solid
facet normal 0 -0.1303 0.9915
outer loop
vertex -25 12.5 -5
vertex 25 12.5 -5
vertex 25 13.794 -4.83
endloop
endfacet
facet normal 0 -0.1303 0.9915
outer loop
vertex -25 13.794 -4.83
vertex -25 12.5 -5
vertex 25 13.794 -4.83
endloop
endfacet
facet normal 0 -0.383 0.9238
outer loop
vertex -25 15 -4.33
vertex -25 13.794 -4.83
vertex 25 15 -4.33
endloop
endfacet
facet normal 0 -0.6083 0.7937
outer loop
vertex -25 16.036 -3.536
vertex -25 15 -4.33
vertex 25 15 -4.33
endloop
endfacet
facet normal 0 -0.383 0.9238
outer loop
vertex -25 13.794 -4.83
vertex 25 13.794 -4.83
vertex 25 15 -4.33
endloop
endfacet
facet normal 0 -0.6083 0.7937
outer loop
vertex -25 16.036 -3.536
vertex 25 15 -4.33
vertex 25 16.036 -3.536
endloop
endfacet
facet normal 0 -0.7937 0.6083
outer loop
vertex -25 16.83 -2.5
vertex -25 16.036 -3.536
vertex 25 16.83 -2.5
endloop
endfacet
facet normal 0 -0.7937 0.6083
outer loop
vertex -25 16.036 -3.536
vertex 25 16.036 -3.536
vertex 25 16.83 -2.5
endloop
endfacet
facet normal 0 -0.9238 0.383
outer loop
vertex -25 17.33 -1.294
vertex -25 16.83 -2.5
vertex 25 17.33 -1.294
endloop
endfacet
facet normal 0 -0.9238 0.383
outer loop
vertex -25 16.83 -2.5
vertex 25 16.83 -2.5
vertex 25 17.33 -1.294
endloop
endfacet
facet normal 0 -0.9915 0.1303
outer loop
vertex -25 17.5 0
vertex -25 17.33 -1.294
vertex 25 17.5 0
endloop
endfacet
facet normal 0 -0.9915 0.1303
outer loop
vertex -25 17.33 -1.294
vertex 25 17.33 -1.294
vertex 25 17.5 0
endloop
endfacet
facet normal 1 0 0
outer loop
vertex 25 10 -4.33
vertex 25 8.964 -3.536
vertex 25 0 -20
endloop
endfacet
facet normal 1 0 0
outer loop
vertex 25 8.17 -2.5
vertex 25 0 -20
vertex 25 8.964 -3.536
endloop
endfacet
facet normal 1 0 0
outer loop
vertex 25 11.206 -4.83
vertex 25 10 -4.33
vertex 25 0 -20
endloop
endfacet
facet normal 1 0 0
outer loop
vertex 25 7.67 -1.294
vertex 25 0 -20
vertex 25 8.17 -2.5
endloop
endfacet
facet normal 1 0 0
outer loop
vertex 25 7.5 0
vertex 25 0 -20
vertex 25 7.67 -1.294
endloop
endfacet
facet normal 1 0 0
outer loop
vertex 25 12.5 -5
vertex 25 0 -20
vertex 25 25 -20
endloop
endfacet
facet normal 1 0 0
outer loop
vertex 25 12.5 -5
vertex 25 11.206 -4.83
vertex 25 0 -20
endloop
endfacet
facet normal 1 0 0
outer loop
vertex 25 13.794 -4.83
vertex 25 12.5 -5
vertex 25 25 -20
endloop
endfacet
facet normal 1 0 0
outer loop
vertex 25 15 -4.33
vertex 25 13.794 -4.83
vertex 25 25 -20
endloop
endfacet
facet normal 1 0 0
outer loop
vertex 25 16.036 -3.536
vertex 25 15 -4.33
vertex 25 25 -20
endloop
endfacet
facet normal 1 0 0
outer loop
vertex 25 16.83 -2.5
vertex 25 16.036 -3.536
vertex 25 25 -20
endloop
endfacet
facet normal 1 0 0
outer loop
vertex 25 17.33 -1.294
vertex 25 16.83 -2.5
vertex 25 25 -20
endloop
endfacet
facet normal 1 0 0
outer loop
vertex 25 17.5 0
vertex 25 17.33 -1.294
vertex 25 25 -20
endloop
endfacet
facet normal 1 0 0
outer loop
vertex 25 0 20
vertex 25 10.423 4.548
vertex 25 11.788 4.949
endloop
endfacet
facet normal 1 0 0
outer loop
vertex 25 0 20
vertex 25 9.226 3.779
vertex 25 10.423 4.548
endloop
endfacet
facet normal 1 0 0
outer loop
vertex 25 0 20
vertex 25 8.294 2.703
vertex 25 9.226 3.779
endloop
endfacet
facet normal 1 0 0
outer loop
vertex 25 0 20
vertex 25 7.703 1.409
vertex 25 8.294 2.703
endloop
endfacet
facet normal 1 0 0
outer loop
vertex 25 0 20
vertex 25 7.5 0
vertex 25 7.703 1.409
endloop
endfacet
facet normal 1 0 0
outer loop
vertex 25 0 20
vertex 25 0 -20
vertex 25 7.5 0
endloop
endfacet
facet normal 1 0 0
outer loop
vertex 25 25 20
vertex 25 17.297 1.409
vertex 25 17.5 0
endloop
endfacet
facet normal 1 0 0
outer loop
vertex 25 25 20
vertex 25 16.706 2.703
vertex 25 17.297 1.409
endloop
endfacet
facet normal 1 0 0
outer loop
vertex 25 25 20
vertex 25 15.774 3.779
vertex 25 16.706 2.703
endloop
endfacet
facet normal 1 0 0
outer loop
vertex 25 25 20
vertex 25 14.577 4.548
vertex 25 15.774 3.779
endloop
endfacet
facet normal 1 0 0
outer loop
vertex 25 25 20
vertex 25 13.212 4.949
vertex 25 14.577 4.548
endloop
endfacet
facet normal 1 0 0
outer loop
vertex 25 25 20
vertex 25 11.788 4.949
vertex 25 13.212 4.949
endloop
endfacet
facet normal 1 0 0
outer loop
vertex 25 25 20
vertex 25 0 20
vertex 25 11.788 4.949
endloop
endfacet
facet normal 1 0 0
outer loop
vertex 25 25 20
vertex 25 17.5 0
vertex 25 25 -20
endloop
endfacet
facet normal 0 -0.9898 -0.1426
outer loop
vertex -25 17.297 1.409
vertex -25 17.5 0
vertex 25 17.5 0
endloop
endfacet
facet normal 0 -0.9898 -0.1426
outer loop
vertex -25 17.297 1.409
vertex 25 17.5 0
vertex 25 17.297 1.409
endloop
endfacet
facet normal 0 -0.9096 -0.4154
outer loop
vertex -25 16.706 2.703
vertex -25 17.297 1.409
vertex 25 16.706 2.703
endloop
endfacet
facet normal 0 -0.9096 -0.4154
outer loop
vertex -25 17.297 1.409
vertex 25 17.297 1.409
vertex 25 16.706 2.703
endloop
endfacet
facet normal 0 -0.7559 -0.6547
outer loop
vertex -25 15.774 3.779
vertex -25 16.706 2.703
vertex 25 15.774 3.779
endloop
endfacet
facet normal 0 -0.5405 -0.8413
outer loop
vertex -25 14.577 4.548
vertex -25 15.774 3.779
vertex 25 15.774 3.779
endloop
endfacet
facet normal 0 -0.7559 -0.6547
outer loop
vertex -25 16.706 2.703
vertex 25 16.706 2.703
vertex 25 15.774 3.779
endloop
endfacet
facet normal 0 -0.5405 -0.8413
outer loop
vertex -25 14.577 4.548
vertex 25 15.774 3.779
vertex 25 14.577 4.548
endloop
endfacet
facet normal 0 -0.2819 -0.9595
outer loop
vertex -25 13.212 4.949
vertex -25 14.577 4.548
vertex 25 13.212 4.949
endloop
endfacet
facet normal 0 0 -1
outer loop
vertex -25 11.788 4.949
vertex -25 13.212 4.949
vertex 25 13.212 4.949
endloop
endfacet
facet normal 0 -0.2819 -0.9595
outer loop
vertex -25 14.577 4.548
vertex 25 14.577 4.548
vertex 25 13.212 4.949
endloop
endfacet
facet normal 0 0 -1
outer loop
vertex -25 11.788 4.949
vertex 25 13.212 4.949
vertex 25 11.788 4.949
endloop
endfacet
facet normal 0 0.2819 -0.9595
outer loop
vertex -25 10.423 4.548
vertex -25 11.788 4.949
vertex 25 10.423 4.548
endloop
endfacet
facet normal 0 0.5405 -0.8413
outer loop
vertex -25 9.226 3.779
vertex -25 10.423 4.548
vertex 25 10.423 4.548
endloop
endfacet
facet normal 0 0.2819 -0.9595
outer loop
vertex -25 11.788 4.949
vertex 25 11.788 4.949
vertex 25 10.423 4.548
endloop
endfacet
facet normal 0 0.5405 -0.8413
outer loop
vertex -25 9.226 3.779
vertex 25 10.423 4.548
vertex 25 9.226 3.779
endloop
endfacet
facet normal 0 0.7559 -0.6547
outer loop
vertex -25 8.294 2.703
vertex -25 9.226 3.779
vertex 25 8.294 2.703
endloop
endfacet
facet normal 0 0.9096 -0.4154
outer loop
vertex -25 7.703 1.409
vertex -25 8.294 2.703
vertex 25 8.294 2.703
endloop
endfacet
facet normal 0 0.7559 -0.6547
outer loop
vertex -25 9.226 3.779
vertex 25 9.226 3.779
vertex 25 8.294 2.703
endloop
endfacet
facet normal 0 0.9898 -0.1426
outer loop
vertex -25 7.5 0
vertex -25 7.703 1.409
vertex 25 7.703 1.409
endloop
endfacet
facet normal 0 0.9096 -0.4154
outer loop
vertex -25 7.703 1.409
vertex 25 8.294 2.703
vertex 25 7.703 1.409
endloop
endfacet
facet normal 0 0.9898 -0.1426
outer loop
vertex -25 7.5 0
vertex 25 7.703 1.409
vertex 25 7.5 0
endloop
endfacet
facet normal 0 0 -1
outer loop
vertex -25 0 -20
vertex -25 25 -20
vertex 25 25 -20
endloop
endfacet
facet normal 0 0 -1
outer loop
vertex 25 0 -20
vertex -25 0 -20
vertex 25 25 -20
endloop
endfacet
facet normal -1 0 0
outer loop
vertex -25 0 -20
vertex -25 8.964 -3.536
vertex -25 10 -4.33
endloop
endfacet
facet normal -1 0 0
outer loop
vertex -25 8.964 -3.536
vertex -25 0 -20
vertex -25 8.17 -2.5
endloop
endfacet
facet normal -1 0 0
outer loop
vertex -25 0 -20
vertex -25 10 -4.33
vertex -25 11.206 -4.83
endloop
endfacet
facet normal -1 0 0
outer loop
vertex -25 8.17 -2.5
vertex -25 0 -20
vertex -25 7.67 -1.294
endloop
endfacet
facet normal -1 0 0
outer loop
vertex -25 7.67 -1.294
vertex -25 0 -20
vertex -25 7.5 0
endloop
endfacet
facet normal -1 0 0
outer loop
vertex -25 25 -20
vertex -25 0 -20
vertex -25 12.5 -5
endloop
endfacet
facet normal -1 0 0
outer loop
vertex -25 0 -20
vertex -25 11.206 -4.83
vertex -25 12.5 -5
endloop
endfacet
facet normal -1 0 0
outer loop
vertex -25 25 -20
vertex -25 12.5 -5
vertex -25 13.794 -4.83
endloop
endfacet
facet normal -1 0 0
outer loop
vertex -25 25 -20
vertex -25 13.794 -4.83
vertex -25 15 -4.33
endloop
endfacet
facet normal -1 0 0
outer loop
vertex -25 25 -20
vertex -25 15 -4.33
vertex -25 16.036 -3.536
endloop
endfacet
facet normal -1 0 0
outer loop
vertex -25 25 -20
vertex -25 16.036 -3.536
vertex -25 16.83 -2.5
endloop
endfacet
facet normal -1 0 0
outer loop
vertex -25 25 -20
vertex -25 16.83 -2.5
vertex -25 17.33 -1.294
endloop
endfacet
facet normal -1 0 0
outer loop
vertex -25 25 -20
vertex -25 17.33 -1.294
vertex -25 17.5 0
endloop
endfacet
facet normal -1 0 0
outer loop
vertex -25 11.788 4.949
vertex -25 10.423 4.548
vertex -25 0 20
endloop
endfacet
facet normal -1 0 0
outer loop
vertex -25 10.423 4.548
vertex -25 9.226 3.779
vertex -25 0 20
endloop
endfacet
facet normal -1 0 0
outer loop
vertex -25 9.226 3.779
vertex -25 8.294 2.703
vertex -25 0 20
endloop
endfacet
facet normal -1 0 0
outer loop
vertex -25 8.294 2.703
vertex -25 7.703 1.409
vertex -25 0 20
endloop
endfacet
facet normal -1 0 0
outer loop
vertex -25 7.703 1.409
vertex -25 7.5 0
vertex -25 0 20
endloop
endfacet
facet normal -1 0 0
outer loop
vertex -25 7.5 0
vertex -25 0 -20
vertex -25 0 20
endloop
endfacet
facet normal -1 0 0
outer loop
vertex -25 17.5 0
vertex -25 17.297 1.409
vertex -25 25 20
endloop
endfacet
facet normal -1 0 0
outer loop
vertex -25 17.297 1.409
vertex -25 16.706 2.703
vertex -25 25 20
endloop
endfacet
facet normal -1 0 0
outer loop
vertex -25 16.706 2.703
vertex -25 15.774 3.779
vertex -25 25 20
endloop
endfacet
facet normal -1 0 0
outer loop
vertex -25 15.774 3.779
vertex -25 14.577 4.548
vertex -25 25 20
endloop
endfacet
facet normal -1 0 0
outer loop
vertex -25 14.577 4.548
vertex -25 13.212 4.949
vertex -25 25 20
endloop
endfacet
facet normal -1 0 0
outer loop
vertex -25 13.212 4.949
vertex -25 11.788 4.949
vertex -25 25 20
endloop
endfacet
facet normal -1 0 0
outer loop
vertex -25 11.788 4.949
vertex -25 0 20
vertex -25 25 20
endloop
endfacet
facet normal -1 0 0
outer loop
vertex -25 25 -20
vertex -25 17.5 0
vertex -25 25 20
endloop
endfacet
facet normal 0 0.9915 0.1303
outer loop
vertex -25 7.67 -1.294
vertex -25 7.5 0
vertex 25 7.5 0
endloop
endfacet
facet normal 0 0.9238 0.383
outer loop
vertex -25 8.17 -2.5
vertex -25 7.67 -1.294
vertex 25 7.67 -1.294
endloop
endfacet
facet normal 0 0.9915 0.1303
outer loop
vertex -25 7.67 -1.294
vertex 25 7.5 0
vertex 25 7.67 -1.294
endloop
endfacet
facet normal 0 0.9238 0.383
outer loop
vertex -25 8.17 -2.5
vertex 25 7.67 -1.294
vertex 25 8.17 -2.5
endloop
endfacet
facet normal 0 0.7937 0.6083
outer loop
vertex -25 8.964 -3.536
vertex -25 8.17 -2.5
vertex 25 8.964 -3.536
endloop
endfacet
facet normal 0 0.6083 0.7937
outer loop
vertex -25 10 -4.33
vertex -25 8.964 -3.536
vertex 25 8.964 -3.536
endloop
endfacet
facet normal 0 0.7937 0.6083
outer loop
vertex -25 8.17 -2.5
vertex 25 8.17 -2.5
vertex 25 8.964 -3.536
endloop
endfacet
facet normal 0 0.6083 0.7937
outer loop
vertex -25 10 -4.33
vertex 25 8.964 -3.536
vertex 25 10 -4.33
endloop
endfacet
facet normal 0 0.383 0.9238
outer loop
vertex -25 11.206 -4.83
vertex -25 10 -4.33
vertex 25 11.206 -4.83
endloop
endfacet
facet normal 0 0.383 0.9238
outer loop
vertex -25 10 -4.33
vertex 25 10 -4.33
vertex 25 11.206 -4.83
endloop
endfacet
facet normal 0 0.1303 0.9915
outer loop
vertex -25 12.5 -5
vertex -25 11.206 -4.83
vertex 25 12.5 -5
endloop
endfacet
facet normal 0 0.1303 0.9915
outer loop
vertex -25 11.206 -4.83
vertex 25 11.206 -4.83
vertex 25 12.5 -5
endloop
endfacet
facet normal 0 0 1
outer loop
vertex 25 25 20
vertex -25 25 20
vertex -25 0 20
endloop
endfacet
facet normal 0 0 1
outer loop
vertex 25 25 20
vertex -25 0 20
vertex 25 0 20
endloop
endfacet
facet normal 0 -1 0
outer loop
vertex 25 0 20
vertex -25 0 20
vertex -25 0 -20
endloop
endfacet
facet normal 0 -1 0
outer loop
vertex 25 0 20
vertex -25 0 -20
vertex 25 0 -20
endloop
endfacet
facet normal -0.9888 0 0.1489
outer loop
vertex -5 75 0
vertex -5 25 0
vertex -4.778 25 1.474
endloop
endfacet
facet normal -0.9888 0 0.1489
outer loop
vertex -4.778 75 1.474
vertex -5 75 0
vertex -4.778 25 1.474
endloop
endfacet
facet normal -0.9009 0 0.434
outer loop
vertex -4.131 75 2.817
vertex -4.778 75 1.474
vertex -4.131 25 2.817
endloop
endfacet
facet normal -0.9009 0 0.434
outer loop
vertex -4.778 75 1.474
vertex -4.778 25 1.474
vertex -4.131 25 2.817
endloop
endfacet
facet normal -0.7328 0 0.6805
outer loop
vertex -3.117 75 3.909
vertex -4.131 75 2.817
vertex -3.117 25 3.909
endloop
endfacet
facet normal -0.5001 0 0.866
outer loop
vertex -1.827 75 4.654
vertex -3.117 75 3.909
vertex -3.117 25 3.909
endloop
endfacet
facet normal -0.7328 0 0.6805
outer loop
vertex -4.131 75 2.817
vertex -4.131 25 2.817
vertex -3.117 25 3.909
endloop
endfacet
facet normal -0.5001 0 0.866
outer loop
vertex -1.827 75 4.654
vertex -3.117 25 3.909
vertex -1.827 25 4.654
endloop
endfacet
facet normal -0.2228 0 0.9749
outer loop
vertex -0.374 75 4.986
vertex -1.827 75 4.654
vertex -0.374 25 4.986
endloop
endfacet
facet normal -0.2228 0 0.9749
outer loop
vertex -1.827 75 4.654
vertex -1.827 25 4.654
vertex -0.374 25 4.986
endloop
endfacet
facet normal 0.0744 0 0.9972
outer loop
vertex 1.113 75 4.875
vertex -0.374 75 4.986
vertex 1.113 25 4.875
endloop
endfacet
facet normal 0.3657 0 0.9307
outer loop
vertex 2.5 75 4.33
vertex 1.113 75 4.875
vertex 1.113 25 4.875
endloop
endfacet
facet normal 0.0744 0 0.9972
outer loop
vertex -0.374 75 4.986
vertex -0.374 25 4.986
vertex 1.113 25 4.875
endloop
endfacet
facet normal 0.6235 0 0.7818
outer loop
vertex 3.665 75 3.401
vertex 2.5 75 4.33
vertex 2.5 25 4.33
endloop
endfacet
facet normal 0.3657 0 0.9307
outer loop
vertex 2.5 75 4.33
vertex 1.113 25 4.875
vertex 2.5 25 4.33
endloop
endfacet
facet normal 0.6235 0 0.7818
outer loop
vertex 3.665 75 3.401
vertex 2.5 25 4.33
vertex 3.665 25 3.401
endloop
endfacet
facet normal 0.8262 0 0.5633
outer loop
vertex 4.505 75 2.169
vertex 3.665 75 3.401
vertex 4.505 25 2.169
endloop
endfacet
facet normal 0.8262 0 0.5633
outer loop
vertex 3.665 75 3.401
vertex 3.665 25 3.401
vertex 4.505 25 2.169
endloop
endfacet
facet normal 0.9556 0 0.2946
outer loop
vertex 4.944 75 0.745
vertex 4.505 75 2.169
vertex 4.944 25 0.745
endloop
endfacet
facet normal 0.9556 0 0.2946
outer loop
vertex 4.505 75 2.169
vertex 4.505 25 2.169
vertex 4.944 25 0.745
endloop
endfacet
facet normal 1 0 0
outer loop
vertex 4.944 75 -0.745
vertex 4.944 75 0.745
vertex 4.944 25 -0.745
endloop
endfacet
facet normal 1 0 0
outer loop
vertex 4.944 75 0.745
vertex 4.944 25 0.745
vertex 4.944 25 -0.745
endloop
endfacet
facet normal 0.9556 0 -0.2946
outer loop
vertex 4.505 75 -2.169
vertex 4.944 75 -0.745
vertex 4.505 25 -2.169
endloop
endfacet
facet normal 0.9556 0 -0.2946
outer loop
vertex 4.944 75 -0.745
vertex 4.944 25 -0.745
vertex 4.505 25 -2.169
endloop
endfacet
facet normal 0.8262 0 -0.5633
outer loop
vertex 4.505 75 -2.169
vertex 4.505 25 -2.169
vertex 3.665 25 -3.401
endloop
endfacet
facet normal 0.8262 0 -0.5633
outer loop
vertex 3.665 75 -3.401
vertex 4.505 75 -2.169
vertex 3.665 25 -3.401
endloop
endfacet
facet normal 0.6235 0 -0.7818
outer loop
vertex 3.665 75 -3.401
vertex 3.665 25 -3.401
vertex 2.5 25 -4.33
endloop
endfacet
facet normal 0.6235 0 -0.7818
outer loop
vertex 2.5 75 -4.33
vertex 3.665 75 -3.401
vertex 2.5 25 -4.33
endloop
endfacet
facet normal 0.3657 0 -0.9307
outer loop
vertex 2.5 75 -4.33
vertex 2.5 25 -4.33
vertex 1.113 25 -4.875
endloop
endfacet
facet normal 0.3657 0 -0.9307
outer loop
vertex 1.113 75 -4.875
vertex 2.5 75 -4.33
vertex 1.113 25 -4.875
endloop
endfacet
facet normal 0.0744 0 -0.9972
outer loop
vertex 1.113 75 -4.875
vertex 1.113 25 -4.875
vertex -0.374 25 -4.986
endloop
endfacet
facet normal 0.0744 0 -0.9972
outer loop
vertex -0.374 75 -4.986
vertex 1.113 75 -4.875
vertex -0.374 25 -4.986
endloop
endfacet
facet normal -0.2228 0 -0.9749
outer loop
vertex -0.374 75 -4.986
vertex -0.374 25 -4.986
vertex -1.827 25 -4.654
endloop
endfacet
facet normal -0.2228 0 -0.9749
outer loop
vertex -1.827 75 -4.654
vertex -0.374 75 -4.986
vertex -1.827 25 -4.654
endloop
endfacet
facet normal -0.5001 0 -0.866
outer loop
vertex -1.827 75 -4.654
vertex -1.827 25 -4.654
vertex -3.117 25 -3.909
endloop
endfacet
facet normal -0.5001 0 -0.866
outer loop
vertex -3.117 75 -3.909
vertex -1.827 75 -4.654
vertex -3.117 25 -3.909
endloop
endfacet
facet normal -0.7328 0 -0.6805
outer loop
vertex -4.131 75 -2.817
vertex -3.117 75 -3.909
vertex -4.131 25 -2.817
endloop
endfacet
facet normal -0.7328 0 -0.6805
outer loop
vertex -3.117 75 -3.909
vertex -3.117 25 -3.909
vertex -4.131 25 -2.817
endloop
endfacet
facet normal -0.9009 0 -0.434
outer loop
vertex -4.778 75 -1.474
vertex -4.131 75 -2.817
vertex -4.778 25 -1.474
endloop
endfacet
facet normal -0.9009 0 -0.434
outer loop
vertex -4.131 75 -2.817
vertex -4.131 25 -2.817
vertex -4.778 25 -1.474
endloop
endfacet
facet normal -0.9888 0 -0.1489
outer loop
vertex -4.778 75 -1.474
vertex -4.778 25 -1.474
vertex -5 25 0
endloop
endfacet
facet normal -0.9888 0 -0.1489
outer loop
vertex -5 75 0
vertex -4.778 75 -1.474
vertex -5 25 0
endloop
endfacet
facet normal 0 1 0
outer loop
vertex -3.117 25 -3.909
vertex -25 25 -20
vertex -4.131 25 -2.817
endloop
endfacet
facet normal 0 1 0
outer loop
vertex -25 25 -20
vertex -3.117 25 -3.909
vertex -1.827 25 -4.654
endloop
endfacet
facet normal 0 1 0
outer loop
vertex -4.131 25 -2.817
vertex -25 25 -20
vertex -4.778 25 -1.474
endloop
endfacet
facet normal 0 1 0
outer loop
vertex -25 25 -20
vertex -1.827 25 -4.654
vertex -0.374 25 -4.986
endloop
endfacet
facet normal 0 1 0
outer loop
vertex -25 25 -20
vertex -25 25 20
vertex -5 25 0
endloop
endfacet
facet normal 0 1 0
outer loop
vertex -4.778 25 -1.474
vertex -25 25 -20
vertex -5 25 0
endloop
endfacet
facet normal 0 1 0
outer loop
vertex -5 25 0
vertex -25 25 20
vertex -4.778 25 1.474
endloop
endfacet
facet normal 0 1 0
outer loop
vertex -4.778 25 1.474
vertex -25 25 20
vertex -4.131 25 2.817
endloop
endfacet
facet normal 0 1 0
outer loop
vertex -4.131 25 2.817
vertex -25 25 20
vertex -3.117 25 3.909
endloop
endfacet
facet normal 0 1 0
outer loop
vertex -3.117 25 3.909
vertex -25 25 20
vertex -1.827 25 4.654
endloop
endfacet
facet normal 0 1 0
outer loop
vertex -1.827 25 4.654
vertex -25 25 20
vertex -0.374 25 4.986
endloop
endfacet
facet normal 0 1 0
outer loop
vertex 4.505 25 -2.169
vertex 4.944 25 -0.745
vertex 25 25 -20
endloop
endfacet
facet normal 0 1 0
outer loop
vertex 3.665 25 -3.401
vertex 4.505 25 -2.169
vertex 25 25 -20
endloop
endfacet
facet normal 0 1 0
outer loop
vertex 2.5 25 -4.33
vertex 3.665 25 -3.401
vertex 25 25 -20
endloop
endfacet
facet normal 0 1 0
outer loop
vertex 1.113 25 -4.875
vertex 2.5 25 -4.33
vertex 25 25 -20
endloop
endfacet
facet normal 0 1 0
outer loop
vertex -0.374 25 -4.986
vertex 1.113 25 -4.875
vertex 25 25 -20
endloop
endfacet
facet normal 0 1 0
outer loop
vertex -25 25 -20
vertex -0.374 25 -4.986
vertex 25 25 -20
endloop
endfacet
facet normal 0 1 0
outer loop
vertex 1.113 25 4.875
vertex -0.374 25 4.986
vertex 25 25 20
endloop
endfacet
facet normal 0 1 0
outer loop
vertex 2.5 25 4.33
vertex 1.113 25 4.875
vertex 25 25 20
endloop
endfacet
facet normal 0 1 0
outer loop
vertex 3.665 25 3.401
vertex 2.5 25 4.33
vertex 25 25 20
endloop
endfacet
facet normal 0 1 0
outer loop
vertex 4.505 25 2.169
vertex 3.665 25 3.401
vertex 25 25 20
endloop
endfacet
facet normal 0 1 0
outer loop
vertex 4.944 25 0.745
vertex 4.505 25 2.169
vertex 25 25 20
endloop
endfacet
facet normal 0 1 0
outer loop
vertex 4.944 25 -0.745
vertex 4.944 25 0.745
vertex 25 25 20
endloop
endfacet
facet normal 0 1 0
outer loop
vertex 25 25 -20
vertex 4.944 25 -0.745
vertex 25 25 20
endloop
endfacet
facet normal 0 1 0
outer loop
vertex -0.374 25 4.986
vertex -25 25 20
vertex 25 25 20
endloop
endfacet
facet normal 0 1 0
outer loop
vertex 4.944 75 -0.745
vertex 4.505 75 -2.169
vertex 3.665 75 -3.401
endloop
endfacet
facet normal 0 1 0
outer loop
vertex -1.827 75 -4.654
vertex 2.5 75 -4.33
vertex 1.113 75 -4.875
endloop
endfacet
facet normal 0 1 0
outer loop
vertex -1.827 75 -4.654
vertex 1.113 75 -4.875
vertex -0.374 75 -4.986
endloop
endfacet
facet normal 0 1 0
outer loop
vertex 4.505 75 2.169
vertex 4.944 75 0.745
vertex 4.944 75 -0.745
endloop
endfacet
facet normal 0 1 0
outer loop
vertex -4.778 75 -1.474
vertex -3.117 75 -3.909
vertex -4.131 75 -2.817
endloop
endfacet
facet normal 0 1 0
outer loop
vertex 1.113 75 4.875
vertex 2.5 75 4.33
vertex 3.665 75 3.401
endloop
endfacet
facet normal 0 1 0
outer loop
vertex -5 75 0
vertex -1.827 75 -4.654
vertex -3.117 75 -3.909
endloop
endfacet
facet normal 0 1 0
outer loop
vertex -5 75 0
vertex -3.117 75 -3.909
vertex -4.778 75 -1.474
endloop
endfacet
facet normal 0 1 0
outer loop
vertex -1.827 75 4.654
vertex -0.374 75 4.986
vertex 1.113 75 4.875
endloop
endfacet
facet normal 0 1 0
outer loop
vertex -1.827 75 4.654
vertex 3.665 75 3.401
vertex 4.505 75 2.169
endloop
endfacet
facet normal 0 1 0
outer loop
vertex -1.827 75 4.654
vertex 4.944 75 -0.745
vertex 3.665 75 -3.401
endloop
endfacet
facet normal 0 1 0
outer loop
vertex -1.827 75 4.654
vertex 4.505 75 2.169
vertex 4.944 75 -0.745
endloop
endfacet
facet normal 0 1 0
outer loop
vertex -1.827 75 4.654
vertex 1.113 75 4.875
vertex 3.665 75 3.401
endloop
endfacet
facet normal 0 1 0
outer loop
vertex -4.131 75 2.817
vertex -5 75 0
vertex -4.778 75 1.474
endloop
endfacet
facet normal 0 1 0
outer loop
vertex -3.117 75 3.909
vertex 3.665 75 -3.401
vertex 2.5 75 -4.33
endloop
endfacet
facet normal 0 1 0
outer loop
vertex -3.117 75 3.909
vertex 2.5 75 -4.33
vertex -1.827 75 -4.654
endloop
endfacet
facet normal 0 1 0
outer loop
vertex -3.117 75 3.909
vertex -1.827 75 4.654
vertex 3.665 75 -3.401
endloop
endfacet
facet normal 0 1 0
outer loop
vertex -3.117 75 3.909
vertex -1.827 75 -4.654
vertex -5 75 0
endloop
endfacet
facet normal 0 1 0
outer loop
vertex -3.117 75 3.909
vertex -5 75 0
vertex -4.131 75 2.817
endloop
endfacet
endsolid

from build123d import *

# Parameters (mm, degrees)
SKETCH1_W           = 50
SKETCH1_H           = 25
BOSS_EXTRUDE1_DEPTH = 20
SKETCH4_R           = 5
BOSS_EXTRUDE2_DEPTH = 50
CUT_EXTRUDE1_DEPTH  = 50


with BuildPart() as part:
    # Sketch1 → Boss-Extrude1 (new, symmetric)
    with BuildSketch(Plane.XY):
        with Locations((0, 12.5)):
            Rectangle(SKETCH1_W, SKETCH1_H)
    extrude(amount=BOSS_EXTRUDE1_DEPTH, both=True)

    # Sketch4 → Boss-Extrude2 (add)
    with BuildSketch(Plane(origin=(0, 25, 0), x_dir=(1, 0, 0), z_dir=(0, 1, 0))):
        with Locations(Location((0, 0, 0), (0, 0, 180))):
            Circle(SKETCH4_R)
    extrude(amount=BOSS_EXTRUDE2_DEPTH)

    # Sketch6 → Cut-Extrude1 (cut)
    with BuildSketch(Plane(origin=(25, 0, 0), x_dir=(0, 0, -1), z_dir=(1, 0, 0))):
        with BuildLine():
            ThreePointArc((5, 12.5), (3.535533906, 16.035533906), (0, 17.5))
            Line((0, 17.5), (0, 7.5))
            ThreePointArc((0, 7.5), (3.535533906, 8.964466094), (5, 12.5))
        make_face()
        with BuildLine():
            Line((0, 7.5), (0, 17.5))
            ThreePointArc((0, 17.5), (-5, 12.5), (0, 7.5))
        make_face()
    extrude(amount=-CUT_EXTRUDE1_DEPTH, mode=Mode.SUBTRACT)


solid = part.part
